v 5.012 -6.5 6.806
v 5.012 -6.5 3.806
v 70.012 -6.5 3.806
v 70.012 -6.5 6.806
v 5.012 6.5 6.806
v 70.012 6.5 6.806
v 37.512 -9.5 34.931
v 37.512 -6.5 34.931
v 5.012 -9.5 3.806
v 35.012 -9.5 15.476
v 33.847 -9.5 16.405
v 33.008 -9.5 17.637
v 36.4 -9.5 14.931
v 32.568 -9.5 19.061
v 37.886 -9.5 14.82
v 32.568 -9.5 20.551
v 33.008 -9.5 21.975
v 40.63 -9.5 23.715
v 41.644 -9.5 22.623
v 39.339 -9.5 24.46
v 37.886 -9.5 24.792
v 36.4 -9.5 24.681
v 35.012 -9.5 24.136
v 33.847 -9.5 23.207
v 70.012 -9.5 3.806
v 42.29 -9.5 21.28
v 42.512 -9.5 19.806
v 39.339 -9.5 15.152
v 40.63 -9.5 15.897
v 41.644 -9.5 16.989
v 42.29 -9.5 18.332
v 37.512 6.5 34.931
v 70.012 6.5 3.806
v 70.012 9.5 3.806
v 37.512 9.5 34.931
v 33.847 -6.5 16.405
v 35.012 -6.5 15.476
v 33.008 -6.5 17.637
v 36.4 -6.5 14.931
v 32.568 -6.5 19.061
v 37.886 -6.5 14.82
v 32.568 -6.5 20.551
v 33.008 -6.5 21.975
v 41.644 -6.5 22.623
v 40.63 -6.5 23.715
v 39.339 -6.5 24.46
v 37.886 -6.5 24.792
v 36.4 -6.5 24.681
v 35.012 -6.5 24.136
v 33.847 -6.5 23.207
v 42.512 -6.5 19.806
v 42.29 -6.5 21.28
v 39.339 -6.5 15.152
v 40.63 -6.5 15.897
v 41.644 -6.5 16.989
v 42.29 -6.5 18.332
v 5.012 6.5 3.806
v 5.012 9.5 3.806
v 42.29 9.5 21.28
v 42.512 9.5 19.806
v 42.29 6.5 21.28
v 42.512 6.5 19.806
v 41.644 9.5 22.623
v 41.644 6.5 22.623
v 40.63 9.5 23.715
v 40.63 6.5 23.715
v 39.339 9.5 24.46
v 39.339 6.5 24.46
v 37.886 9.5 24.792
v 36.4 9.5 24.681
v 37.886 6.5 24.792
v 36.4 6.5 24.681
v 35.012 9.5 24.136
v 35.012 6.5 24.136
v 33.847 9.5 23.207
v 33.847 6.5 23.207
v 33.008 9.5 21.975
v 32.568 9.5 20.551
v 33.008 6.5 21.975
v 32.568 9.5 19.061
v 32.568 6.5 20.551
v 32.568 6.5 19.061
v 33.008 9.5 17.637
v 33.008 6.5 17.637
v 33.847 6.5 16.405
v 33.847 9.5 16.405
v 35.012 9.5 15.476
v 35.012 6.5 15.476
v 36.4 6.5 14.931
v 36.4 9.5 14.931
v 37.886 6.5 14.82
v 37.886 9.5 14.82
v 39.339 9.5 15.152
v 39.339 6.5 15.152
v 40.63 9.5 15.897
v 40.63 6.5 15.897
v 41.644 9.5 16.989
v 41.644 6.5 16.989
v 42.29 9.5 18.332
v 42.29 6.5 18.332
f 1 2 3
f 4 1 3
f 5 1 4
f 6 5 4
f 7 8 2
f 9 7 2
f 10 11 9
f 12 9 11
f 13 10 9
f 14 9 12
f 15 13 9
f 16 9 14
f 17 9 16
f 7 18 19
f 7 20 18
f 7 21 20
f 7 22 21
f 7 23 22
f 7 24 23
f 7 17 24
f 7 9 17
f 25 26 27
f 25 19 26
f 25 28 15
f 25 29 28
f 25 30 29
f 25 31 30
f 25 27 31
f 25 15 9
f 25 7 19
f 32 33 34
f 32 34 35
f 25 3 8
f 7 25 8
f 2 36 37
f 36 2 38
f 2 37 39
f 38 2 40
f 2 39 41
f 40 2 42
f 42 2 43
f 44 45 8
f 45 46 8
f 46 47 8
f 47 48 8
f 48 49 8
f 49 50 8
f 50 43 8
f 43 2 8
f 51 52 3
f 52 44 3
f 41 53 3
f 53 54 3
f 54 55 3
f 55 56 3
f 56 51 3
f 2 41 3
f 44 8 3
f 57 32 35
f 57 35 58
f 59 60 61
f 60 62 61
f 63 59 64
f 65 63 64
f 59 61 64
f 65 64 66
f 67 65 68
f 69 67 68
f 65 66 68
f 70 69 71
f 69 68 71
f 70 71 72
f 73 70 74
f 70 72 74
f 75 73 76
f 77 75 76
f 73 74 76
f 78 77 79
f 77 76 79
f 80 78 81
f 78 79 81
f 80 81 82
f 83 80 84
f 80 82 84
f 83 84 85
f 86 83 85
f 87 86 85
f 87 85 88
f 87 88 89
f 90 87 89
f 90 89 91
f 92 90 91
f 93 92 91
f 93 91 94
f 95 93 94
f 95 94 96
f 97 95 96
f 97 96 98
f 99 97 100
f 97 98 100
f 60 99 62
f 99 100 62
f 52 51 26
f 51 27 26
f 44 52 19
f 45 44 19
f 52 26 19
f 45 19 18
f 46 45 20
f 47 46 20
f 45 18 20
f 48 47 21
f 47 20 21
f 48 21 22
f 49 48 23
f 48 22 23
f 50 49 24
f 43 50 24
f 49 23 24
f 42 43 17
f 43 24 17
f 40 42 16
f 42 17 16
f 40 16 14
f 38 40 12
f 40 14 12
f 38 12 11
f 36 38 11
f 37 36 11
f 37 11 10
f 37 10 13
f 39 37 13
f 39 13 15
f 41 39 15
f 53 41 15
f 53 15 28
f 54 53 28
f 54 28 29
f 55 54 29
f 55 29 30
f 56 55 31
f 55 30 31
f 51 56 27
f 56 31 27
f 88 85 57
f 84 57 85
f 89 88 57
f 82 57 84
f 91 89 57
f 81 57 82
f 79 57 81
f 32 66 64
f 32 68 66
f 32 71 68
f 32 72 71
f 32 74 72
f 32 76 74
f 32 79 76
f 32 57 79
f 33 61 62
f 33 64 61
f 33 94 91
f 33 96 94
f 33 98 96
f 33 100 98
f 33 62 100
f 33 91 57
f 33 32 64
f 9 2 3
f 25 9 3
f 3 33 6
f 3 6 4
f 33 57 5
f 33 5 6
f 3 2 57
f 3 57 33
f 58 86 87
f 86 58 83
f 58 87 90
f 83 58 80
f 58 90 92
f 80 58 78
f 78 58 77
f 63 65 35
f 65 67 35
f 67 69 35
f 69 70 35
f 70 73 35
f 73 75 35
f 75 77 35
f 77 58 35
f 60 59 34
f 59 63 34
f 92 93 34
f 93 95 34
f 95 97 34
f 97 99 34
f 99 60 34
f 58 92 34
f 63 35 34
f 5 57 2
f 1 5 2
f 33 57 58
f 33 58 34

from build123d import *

# Parameters (mm, degrees)
F2_DEPTH = 3
F4_W     = 65
F4_H     = 13
F5_DEPTH = 3
F6_R     = 5
F7_DEPTH = 12.5


with BuildPart() as f2:
    # F1 (on offset) → F2 (new body)
    with BuildSketch(Plane.XZ.offset(6.5)):
        Polygon((37.512457, 34.930761), (5.012457, 3.806012), (70.012457, 3.806012), align=None)
    extrude(amount=F2_DEPTH)


with BuildPart() as f3_1:
    # F3: instance of F2
    add(f2.part.mirror(Plane.XZ))


with BuildPart() as f5:
    # F4 (on face) → F5 (new body)
    with BuildSketch(Plane(origin=(0, 0, 3.806012), x_dir=(1, 0, 0), z_dir=(0, 0, -1))):
        with Locations((37.512457, 0)):
            Rectangle(F4_W, F4_H)
    extrude(amount=-F5_DEPTH)


with BuildPart() as f7_tool:
    # F6 (on Front) → F7 (new body, symmetric)
    with BuildSketch(Plane.XZ):
        with Locations((37.512457, 19.806012)):
            Circle(F6_R)
    extrude(amount=F7_DEPTH, both=True)


with BuildPart() as f2_1:
    add(f2.part)

    # F7: cut by f7_tool
    add(f7_tool.part, mode=Mode.SUBTRACT)


with BuildPart() as f3_1_1:
    add(f3_1.part)

    # F7: cut by f7_tool
    add(f7_tool.part, mode=Mode.SUBTRACT)


solid = Compound([f5.part, f2_1.part, f3_1_1.part])
